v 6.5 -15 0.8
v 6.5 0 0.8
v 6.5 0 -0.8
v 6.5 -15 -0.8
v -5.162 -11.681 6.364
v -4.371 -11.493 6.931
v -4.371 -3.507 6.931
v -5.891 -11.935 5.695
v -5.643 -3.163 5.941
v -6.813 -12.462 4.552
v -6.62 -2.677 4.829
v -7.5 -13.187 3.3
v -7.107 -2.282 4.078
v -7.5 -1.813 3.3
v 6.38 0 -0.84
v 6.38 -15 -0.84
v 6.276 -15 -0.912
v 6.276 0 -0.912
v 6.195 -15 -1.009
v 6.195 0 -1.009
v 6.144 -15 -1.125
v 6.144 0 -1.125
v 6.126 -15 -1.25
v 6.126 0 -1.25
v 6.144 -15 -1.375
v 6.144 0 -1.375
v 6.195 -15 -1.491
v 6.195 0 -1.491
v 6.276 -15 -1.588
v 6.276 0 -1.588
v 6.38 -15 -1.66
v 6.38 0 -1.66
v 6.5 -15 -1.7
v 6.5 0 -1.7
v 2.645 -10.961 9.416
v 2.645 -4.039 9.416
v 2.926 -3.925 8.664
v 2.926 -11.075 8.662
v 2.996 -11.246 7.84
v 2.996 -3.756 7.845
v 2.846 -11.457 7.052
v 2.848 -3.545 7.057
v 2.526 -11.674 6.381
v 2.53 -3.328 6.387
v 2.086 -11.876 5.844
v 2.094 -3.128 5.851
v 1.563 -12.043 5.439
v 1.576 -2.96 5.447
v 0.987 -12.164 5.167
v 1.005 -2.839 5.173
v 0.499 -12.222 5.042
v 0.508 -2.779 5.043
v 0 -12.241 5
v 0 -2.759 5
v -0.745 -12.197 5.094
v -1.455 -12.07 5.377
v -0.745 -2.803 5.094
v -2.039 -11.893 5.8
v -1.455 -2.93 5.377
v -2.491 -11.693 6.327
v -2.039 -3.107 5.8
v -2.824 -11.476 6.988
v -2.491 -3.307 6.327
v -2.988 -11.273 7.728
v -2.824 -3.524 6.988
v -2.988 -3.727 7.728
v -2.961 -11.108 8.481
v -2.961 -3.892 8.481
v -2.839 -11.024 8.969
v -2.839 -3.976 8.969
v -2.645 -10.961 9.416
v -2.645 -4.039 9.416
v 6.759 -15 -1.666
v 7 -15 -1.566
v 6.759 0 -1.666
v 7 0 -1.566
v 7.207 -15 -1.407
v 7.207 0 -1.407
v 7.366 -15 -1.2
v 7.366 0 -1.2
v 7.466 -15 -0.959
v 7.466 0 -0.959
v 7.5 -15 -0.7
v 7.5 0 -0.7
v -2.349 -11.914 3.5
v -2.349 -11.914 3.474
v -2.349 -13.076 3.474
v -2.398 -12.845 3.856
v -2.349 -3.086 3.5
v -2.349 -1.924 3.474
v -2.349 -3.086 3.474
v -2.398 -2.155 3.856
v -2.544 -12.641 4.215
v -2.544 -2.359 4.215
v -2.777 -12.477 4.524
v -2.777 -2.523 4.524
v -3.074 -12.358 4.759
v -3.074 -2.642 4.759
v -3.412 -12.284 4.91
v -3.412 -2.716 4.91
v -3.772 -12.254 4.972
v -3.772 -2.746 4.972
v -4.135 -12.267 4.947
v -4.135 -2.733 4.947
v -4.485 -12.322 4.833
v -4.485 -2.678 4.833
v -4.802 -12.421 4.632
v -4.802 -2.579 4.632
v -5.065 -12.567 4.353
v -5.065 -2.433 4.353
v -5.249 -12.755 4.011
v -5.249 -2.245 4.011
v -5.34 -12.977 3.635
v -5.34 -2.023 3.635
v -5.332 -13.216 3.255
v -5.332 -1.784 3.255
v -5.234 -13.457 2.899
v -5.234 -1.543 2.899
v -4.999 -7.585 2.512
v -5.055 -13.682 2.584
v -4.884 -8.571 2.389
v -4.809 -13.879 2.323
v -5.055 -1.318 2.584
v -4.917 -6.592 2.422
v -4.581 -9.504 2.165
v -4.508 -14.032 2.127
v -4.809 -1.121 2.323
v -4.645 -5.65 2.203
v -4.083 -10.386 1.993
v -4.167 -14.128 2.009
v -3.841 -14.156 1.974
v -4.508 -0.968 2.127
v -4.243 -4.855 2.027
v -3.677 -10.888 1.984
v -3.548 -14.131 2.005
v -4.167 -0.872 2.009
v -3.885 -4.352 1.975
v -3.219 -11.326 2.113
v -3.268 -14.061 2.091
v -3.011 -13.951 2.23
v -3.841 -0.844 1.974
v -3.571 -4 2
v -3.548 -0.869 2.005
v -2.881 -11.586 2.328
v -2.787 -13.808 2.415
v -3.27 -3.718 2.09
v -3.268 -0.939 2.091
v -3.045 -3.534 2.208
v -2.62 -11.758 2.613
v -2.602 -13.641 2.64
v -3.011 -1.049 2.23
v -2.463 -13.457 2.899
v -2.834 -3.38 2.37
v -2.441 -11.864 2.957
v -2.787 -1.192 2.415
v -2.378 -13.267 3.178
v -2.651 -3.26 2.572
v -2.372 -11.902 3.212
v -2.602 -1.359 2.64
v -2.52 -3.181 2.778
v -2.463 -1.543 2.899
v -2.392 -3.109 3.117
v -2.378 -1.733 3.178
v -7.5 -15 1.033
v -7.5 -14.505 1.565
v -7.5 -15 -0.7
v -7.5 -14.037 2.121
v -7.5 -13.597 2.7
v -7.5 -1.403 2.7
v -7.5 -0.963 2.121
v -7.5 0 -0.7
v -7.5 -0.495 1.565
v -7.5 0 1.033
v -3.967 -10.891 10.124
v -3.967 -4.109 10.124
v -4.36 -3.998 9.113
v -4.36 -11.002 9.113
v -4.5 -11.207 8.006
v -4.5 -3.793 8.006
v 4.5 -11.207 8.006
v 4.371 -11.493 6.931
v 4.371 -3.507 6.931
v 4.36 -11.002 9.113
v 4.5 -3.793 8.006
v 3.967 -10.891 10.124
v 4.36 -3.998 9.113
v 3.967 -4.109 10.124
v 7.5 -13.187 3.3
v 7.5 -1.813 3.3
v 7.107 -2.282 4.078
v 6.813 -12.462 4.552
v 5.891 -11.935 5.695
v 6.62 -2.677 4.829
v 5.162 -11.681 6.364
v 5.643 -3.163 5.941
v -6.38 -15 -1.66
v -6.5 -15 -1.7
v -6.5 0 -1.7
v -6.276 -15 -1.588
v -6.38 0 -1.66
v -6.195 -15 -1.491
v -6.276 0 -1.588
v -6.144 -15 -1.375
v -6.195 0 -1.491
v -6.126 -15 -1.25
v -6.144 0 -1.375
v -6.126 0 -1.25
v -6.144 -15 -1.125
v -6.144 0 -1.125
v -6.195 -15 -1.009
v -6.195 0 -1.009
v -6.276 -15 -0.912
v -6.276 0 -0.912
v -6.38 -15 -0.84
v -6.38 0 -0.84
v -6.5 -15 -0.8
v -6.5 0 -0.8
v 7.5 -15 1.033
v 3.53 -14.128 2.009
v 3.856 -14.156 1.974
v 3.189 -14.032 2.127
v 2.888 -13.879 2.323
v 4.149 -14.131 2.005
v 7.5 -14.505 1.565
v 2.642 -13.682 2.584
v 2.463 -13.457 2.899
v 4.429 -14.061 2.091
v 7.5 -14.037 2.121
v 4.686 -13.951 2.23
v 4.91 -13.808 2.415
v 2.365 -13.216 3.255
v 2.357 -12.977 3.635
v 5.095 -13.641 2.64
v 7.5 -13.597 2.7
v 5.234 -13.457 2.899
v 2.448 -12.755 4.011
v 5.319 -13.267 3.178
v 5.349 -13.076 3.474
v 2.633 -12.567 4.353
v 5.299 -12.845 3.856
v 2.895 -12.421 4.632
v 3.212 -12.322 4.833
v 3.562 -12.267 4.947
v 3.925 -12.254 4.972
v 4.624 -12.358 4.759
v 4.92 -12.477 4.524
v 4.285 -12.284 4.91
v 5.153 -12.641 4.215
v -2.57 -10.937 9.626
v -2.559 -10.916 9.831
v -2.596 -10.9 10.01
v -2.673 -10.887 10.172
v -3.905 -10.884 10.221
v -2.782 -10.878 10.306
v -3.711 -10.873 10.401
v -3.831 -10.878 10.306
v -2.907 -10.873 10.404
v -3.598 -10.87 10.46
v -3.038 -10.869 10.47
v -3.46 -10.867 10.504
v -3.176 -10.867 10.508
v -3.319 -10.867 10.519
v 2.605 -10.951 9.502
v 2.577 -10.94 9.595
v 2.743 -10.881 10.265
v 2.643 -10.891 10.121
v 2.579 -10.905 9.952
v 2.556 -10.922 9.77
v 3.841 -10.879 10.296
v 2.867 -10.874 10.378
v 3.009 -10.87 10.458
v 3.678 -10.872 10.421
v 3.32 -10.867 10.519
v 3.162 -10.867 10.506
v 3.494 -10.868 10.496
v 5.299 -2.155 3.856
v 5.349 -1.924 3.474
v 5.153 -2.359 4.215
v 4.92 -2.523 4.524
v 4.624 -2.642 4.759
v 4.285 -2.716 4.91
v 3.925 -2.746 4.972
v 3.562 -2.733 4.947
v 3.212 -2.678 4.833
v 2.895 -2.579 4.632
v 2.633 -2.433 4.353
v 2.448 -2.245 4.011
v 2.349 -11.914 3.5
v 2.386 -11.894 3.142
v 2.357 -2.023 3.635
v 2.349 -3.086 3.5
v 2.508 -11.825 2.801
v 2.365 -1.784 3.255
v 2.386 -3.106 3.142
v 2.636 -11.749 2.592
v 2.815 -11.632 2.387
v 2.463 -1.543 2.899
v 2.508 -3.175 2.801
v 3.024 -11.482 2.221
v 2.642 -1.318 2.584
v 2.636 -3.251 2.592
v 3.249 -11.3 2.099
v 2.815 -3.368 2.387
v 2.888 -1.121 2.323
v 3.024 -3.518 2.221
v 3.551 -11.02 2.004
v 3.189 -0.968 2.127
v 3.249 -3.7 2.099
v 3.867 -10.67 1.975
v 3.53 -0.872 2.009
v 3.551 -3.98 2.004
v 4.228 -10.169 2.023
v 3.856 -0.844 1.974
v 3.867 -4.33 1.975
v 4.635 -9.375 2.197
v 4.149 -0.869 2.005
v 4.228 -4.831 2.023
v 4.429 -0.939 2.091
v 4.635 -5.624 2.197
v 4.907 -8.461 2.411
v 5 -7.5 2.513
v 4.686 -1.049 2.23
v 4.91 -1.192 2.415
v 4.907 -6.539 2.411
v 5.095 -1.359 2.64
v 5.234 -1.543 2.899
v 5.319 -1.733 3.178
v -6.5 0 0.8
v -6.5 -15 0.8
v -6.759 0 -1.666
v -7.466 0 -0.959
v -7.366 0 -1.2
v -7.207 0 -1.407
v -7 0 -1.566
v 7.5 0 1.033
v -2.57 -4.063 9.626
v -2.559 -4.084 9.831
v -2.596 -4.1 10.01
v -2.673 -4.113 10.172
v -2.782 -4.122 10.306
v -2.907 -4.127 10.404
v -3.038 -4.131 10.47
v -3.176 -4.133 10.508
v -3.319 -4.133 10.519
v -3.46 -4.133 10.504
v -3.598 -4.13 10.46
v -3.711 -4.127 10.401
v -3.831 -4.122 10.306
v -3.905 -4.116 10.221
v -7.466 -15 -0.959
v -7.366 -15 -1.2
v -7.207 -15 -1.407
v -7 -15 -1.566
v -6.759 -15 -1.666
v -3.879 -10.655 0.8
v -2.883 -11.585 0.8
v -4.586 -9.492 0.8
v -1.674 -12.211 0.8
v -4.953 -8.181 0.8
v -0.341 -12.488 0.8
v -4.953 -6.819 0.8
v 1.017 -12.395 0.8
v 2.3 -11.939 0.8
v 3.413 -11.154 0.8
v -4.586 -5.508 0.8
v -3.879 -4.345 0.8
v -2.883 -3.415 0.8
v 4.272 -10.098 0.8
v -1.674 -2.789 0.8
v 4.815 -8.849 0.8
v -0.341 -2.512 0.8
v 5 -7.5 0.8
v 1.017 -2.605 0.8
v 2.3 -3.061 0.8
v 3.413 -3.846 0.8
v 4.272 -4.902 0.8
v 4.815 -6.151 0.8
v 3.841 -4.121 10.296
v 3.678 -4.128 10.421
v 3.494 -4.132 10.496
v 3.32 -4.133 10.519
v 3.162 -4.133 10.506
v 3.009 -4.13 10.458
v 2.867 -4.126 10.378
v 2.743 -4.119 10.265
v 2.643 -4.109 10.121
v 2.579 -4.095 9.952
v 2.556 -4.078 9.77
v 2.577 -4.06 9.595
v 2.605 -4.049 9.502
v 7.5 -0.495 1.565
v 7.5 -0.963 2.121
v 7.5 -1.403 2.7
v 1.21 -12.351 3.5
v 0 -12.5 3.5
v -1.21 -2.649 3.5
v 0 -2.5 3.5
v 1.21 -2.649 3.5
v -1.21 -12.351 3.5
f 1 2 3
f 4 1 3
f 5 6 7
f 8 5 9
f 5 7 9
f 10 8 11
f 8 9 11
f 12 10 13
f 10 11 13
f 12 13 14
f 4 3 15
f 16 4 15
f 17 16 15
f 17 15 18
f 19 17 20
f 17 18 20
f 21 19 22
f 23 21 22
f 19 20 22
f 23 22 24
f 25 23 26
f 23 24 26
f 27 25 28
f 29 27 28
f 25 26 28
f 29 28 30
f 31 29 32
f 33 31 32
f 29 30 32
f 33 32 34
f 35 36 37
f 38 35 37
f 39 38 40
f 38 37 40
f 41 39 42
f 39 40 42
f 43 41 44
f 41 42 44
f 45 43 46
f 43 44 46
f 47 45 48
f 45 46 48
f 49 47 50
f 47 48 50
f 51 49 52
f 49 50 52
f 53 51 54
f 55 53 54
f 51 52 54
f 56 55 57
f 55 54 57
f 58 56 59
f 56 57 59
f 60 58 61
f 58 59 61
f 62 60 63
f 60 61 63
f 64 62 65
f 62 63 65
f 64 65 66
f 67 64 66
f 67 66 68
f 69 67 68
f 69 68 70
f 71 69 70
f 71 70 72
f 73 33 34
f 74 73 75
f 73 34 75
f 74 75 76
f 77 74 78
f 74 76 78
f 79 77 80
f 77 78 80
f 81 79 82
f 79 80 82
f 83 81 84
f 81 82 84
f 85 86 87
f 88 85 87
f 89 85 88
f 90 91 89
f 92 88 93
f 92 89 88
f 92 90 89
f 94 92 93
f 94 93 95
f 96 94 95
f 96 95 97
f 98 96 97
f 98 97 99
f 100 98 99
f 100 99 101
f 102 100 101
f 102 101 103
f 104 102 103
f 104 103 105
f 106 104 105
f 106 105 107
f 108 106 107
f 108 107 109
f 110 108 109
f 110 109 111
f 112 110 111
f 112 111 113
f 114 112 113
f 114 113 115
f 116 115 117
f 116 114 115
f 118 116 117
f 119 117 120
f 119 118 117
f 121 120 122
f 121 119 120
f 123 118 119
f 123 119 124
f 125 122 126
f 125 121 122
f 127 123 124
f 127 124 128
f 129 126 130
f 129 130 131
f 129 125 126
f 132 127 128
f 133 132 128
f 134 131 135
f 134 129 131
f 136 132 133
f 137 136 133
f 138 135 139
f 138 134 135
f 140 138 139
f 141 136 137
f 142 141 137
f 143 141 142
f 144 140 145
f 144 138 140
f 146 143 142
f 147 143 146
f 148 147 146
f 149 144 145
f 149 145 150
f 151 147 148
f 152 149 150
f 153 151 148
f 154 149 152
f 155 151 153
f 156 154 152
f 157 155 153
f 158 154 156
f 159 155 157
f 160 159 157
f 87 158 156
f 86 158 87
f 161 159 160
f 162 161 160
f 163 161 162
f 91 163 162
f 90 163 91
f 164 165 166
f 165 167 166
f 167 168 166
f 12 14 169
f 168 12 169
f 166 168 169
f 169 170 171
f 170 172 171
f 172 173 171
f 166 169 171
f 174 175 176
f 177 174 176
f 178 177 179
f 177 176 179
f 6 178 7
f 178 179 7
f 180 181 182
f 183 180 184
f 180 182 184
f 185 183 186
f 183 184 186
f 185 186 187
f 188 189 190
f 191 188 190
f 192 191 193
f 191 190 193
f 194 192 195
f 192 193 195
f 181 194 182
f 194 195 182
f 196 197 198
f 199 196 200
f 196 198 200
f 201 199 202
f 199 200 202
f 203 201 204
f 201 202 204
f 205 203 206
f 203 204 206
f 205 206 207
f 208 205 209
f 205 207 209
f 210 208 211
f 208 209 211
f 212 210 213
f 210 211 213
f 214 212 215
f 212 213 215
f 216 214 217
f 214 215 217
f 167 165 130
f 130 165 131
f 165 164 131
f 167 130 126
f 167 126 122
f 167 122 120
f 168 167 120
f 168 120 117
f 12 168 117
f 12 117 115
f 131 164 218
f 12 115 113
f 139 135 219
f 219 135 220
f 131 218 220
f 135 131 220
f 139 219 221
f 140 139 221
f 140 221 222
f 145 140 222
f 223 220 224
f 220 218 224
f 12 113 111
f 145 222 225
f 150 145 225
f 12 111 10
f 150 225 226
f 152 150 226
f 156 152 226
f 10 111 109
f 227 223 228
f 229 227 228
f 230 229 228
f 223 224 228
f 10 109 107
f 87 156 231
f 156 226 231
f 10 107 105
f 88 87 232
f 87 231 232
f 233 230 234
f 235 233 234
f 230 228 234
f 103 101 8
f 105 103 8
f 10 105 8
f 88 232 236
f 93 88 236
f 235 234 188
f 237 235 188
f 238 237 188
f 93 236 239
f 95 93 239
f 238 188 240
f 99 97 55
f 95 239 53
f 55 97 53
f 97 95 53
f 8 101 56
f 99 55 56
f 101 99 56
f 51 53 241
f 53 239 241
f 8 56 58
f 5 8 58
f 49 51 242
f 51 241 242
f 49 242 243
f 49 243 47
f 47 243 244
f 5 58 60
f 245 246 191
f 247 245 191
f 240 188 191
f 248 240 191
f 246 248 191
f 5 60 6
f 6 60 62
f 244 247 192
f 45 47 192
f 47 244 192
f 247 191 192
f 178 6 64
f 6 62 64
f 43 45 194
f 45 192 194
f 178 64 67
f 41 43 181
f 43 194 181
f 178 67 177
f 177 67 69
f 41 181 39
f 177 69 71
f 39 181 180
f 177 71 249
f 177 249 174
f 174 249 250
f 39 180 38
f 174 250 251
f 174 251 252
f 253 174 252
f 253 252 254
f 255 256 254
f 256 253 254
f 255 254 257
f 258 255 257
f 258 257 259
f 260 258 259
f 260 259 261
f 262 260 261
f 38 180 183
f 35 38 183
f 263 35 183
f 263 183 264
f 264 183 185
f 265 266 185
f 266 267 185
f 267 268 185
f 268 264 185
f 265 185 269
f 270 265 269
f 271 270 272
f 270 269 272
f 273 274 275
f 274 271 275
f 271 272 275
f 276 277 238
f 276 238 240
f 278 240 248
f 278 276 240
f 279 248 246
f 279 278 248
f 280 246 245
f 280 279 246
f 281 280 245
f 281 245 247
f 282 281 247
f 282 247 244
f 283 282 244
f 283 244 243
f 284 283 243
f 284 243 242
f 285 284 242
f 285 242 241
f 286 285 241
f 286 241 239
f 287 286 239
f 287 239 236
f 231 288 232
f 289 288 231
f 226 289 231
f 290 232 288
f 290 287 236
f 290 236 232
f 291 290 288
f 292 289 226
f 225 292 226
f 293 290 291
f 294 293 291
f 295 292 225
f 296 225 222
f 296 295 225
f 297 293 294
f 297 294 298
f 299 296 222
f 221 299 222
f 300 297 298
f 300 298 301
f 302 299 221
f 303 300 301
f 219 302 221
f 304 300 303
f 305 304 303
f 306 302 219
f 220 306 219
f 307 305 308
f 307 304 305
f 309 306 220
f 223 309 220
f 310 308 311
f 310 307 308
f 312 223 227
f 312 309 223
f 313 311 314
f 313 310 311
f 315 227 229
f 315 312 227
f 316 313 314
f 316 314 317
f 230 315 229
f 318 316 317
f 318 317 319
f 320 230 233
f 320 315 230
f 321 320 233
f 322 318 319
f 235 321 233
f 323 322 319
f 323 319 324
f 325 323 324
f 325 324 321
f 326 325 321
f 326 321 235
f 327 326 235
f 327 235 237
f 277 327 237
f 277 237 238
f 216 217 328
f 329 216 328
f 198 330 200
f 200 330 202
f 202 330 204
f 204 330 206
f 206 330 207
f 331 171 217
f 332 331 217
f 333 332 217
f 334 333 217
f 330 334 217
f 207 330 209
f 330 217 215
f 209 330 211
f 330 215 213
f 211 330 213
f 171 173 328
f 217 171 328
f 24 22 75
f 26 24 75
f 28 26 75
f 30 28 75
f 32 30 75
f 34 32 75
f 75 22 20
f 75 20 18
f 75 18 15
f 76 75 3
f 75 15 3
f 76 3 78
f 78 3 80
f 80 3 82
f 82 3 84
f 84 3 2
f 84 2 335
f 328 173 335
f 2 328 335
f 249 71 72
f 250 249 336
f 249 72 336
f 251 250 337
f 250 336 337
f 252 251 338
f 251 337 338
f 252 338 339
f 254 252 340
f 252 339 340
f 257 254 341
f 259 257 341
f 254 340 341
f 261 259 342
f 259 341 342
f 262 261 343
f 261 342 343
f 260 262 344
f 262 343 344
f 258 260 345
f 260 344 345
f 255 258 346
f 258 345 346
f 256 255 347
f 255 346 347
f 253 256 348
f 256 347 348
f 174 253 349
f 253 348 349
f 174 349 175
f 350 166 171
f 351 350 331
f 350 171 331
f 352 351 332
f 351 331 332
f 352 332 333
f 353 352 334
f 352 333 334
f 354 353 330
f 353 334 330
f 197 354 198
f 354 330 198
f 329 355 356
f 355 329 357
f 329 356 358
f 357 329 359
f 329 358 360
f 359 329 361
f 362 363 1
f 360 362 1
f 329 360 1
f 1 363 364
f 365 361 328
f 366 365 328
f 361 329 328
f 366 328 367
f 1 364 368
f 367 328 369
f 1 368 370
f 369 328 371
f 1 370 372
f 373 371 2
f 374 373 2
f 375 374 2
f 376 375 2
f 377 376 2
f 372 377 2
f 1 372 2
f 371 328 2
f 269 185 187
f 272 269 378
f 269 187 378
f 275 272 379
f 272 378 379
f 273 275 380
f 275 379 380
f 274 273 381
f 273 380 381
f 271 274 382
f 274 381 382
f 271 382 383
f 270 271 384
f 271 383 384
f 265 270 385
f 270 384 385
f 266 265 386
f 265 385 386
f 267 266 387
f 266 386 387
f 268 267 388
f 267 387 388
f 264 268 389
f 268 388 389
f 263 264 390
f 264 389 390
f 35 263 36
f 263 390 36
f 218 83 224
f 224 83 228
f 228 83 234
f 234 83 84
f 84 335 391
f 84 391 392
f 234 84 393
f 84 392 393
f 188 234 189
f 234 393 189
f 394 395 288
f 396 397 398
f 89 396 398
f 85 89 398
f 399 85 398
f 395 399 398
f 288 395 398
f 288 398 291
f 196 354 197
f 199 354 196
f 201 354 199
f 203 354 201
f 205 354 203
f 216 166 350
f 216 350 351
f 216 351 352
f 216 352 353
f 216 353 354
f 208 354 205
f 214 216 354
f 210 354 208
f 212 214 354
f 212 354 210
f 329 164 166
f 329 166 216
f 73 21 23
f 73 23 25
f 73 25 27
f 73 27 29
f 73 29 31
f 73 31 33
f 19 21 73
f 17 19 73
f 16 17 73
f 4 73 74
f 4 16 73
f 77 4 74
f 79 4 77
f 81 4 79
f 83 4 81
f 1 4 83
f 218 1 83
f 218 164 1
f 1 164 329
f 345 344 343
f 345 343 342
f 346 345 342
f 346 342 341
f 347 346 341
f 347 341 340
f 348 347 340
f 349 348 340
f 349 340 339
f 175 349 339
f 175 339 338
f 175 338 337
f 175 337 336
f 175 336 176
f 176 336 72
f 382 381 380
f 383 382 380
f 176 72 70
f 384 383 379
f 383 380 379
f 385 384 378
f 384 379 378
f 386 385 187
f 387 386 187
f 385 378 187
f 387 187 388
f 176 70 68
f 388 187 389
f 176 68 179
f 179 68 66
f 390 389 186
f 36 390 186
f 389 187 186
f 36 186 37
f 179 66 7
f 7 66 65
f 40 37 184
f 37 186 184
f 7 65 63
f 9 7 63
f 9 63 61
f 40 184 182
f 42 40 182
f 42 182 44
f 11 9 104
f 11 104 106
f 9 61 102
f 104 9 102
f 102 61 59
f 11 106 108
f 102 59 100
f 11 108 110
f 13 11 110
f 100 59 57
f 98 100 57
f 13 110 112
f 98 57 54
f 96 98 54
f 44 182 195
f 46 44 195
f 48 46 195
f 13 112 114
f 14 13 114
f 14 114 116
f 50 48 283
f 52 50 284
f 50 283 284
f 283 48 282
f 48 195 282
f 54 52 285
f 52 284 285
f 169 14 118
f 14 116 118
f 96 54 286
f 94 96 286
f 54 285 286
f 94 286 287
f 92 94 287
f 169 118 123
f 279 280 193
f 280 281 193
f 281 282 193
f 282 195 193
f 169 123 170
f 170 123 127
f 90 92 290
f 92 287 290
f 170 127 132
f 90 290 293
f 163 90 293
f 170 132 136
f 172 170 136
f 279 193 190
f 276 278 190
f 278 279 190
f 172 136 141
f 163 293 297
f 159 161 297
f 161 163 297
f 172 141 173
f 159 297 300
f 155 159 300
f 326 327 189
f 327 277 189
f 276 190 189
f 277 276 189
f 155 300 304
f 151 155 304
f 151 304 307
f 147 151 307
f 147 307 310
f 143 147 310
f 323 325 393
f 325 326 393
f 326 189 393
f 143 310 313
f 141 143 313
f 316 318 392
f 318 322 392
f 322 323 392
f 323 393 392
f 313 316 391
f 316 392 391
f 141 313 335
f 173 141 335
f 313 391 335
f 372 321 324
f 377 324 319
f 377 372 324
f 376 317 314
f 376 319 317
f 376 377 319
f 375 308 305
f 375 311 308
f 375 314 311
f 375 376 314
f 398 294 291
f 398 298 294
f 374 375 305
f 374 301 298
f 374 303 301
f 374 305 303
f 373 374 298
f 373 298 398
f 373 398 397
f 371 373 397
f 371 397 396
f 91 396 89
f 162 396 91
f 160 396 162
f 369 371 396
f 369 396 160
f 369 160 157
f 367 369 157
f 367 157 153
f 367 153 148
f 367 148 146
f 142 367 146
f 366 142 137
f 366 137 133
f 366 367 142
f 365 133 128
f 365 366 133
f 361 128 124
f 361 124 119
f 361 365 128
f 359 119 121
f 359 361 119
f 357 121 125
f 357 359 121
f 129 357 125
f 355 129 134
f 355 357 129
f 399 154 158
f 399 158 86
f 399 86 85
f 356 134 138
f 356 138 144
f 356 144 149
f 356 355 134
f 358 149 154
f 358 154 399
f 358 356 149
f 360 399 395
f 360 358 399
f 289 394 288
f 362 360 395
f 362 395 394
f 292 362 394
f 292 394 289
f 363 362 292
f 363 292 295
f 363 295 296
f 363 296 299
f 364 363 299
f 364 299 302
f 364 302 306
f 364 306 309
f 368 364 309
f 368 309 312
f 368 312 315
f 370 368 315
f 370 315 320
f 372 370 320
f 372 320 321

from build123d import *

# Parameters (mm, degrees)
F0_R          = 1.5
F1_DEPTH      = 15
F2_R          = 14.550115737
F3_DEPTH      = 25
F3_DEPTH_BACK = 25
F4_R          = 5
F5_DEPTH      = 3.5


# Not quite as in the source:
# - ends of sketch curves that miss each other by under 0.0002 mm in the source are joined


with BuildPart() as f1:
    # F0 (on Front) → F1 (new body)
    with BuildSketch(Plane.XZ):
        with BuildLine():
            Line((-6.5, -0.8), (-6.5, 0.8))
            Line((-6.5, 0.8), (6.5, 0.8))
            Line((6.5, 0.8), (6.5, -0.8))
            ThreePointArc((6.5, -0.8), (6.1264578545, -1.2499931592), (6.4999470351, -1.7000302796))
            ThreePointArc((6.4999470351, -1.7000302796), (7.2070390333, -1.4071599085), (7.4999451737, -0.7000767547))
            Line((7.4999451737, -0.7000767547), (7.5000913757, 3.3000402053))
            ThreePointArc((7.5000913757, 3.3000402053), (6.2070011857, 5.3492777345), (4.3711160801, 6.93072725))
            ThreePointArc((4.3711160801, 6.93072725), (4.4644607322, 8.5644381014), (3.967454999, 10.1235114388))
            ThreePointArc((3.967454999, 10.1235114388), (2.952293926, 10.4308353655), (2.6449699993, 9.4156742925))
            ThreePointArc((2.6449699993, 9.4156742925), (0, 5), (-2.6449699993, 9.4156742925))
            ThreePointArc((-2.6449699993, 9.4156742925), (-2.952293926, 10.4308353655), (-3.967454999, 10.1235114388))
            ThreePointArc((-3.967454999, 10.1235114388), (-4.4644607322, 8.5644381014), (-4.3711160801, 6.93072725))
            ThreePointArc((-4.3711160801, 6.93072725), (-6.2070011857, 5.3492777345), (-7.5000913757, 3.3000402053))
            Line((-7.5000913757, 3.3000402053), (-7.4999451737, -0.7000767547))
            ThreePointArc((-7.4999451737, -0.7000767547), (-7.2070390333, -1.4071599085), (-6.4999451744, -1.7000402053))
            ThreePointArc((-6.4999451744, -1.7000402053), (-6.1264578541, -1.2500021402), (-6.5, -0.8))
        make_face()
        with Locations((-3.848537337, 3.4744446166)):
            Circle(F0_R, mode=Mode.SUBTRACT)
        with Locations((3.848537337, 3.4744446166)):
            Circle(F0_R, mode=Mode.SUBTRACT)
    extrude(amount=F1_DEPTH)

    # F2 (on Right) → F3 (cut, two sides)
    with BuildSketch(Plane.YZ) as f3_sk:
        with Locations((-25.4004554451, 11.2085361034)):
            Circle(F2_R)
        with Locations((10.4004554451, 11.2085361034)):
            Circle(F2_R)
    extrude(amount=-F3_DEPTH, mode=Mode.SUBTRACT)
    extrude(f3_sk.sketch, amount=F3_DEPTH_BACK, mode=Mode.SUBTRACT)

    # F4 (on Top) → F5 (cut)
    with BuildSketch(Plane.XY):
        with Locations((0, -7.5)):
            Circle(F4_R)
    extrude(amount=F5_DEPTH, mode=Mode.SUBTRACT)


solid = f1.part
